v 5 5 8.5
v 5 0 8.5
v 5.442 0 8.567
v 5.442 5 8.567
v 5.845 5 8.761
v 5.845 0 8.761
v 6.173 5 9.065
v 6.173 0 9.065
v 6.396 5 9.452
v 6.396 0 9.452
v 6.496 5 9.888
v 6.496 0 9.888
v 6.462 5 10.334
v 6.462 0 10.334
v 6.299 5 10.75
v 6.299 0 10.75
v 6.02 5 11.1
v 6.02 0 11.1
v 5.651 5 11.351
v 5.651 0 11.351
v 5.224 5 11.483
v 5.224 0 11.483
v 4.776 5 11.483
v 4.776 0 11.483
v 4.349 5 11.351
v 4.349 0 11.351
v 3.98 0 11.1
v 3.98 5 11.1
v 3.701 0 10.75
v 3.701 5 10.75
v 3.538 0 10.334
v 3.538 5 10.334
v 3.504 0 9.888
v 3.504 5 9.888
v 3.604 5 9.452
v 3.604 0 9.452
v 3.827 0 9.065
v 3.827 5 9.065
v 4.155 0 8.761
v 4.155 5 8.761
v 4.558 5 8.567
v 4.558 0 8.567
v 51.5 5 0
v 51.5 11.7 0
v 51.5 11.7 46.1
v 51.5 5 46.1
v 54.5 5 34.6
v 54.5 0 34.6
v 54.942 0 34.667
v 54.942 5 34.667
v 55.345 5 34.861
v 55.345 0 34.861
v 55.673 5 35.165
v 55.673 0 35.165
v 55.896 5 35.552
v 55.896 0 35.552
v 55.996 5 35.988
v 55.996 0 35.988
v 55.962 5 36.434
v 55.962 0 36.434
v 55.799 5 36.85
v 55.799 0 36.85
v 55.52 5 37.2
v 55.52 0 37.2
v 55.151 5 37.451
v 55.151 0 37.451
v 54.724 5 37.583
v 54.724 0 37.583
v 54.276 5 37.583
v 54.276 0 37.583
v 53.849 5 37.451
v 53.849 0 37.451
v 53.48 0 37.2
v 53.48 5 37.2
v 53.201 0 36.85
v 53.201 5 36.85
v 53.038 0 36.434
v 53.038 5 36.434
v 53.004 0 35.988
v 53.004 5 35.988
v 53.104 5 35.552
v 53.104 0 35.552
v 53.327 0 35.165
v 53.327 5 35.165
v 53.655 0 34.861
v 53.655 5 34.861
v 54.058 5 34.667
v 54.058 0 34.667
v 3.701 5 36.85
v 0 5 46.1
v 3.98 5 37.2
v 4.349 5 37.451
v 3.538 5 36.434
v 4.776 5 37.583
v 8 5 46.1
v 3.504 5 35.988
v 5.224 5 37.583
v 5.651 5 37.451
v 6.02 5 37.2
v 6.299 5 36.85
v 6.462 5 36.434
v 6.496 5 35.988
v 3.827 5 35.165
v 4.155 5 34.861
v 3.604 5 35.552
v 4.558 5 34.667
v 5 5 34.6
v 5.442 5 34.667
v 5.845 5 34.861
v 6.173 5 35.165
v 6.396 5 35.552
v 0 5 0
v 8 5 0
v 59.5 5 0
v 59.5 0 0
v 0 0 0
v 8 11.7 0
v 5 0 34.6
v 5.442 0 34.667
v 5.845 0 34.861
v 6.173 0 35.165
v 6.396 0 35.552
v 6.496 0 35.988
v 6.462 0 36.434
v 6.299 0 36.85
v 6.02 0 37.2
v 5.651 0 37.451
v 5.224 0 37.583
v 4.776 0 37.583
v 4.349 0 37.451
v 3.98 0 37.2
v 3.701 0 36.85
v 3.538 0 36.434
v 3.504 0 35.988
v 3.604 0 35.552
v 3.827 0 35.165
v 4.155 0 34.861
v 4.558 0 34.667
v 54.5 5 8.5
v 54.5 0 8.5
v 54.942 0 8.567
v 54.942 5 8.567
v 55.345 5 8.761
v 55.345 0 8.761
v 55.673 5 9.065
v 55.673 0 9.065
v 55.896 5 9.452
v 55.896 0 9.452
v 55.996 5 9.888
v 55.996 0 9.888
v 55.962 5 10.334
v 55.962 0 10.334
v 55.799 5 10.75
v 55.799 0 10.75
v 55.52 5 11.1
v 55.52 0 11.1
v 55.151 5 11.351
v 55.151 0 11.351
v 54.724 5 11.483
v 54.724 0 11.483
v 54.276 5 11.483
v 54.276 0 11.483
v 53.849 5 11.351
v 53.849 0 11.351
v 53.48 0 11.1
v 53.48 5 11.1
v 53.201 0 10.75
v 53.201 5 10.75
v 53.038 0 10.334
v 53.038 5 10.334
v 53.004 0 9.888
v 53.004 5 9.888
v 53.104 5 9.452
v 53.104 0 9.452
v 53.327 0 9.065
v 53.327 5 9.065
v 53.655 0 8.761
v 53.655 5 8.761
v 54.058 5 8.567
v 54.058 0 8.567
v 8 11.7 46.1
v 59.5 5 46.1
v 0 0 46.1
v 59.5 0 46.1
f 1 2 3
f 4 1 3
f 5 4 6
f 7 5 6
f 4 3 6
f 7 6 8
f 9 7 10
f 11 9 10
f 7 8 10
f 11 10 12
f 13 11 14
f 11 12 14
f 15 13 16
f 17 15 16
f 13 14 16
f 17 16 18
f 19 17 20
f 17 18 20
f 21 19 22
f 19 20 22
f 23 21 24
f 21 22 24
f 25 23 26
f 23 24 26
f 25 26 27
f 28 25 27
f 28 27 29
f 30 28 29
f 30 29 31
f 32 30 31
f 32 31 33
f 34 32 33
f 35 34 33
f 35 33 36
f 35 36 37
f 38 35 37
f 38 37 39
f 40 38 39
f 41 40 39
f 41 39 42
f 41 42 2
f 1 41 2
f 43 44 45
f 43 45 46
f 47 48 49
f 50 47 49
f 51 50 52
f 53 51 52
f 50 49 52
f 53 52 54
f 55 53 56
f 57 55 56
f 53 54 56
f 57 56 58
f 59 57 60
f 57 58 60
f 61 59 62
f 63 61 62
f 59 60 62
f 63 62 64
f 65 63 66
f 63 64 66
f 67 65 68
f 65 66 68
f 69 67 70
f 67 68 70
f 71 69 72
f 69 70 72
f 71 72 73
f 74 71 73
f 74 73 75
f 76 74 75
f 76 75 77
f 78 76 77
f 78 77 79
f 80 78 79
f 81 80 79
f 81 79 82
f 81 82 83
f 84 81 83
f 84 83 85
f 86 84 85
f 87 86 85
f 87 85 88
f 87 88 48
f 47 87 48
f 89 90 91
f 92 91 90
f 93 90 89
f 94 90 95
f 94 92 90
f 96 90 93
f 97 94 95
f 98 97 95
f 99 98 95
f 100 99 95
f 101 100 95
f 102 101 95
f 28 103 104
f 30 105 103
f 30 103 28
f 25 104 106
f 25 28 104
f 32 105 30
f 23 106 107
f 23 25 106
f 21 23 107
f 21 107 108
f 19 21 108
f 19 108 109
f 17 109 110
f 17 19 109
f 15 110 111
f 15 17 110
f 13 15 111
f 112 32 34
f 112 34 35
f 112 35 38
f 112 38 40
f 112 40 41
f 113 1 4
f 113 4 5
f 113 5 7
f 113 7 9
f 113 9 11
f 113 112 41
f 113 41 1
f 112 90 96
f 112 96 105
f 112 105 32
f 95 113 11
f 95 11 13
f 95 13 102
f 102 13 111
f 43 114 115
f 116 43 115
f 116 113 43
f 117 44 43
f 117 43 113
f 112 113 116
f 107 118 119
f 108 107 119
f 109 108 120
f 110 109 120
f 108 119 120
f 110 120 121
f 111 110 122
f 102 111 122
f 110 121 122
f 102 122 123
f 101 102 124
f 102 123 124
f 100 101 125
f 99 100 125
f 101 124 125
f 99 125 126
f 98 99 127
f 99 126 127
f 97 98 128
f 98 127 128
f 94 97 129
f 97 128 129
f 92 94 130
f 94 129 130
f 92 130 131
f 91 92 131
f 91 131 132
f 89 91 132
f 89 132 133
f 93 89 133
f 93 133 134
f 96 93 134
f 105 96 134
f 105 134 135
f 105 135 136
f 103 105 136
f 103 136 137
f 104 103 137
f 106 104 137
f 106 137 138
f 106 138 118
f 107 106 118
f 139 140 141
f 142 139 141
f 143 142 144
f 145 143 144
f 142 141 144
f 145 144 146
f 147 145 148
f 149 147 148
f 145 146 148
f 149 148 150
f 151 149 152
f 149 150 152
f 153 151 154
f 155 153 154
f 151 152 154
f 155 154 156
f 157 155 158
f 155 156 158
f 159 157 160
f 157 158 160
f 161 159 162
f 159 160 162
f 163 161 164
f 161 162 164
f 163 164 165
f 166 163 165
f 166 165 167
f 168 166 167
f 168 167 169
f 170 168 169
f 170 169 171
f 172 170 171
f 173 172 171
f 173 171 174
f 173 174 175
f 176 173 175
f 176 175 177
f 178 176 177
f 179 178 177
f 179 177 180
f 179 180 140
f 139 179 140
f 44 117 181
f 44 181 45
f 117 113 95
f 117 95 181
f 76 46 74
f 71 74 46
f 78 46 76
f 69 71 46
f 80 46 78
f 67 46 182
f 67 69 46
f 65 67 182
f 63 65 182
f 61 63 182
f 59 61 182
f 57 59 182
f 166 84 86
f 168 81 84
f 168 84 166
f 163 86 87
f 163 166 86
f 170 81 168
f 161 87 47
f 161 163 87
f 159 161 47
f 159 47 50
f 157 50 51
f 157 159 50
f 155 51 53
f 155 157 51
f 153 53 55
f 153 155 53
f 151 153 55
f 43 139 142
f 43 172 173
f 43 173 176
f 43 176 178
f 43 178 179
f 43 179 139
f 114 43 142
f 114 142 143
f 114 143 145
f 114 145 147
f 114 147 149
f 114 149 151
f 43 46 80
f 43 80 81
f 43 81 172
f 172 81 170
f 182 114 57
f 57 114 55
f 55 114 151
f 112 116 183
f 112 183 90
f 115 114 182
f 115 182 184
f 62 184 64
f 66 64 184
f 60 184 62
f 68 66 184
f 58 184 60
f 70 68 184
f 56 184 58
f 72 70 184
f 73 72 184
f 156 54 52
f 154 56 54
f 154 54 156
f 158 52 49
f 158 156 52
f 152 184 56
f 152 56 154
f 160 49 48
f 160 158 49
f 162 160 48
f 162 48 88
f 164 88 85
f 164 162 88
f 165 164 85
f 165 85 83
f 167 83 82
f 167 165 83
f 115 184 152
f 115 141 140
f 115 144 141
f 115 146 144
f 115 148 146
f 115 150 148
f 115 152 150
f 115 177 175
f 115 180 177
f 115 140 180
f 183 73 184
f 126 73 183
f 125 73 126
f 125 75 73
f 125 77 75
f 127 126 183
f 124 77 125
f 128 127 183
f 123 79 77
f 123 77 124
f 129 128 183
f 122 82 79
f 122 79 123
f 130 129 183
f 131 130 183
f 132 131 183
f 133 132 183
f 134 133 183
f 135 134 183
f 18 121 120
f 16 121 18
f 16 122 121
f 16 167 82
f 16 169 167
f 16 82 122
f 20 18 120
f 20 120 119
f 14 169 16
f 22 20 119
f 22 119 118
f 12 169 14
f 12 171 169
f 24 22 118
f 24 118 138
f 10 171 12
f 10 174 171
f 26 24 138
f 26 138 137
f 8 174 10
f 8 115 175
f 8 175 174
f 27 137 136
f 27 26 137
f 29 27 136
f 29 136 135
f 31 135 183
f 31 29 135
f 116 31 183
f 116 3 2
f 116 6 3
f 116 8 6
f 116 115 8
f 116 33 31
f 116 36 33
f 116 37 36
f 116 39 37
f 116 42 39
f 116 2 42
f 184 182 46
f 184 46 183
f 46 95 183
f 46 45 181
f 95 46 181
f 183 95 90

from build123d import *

# Parameters (mm, degrees)
EXTRUDE_1_DEPTH     = 46.1
SKETCH_2_R          = 1.5
CUT_EXTRUDE_1_DEPTH = 77.173158002


with BuildPart() as part:
    # 草图1 → 凸台-拉伸1 (new body)
    with BuildSketch(Plane.XY):
        Polygon((0, 0), (0, 5), (8, 5), (8, 11.7), (51.5, 11.7), (51.5, 5), (59.5, 5), (59.5, 0), align=None)
    extrude(amount=EXTRUDE_1_DEPTH)

    # 草图2 → 切除-拉伸1 (cut, through all)
    with BuildSketch(Plane.XZ):
        with Locations(Location((5, 36.1, 0), (0, 0, 270))):
            Circle(SKETCH_2_R)
        with Locations(Location((5, 10, 0), (0, 0, 270))):
            Circle(SKETCH_2_R)
        with Locations(Location((54.5, 36.1, 0), (0, 0, 270))):
            Circle(SKETCH_2_R)
        with Locations(Location((54.5, 10, 0), (0, 0, 270))):
            Circle(SKETCH_2_R)
    extrude(amount=-CUT_EXTRUDE_1_DEPTH, mode=Mode.SUBTRACT)


solid = part.part
